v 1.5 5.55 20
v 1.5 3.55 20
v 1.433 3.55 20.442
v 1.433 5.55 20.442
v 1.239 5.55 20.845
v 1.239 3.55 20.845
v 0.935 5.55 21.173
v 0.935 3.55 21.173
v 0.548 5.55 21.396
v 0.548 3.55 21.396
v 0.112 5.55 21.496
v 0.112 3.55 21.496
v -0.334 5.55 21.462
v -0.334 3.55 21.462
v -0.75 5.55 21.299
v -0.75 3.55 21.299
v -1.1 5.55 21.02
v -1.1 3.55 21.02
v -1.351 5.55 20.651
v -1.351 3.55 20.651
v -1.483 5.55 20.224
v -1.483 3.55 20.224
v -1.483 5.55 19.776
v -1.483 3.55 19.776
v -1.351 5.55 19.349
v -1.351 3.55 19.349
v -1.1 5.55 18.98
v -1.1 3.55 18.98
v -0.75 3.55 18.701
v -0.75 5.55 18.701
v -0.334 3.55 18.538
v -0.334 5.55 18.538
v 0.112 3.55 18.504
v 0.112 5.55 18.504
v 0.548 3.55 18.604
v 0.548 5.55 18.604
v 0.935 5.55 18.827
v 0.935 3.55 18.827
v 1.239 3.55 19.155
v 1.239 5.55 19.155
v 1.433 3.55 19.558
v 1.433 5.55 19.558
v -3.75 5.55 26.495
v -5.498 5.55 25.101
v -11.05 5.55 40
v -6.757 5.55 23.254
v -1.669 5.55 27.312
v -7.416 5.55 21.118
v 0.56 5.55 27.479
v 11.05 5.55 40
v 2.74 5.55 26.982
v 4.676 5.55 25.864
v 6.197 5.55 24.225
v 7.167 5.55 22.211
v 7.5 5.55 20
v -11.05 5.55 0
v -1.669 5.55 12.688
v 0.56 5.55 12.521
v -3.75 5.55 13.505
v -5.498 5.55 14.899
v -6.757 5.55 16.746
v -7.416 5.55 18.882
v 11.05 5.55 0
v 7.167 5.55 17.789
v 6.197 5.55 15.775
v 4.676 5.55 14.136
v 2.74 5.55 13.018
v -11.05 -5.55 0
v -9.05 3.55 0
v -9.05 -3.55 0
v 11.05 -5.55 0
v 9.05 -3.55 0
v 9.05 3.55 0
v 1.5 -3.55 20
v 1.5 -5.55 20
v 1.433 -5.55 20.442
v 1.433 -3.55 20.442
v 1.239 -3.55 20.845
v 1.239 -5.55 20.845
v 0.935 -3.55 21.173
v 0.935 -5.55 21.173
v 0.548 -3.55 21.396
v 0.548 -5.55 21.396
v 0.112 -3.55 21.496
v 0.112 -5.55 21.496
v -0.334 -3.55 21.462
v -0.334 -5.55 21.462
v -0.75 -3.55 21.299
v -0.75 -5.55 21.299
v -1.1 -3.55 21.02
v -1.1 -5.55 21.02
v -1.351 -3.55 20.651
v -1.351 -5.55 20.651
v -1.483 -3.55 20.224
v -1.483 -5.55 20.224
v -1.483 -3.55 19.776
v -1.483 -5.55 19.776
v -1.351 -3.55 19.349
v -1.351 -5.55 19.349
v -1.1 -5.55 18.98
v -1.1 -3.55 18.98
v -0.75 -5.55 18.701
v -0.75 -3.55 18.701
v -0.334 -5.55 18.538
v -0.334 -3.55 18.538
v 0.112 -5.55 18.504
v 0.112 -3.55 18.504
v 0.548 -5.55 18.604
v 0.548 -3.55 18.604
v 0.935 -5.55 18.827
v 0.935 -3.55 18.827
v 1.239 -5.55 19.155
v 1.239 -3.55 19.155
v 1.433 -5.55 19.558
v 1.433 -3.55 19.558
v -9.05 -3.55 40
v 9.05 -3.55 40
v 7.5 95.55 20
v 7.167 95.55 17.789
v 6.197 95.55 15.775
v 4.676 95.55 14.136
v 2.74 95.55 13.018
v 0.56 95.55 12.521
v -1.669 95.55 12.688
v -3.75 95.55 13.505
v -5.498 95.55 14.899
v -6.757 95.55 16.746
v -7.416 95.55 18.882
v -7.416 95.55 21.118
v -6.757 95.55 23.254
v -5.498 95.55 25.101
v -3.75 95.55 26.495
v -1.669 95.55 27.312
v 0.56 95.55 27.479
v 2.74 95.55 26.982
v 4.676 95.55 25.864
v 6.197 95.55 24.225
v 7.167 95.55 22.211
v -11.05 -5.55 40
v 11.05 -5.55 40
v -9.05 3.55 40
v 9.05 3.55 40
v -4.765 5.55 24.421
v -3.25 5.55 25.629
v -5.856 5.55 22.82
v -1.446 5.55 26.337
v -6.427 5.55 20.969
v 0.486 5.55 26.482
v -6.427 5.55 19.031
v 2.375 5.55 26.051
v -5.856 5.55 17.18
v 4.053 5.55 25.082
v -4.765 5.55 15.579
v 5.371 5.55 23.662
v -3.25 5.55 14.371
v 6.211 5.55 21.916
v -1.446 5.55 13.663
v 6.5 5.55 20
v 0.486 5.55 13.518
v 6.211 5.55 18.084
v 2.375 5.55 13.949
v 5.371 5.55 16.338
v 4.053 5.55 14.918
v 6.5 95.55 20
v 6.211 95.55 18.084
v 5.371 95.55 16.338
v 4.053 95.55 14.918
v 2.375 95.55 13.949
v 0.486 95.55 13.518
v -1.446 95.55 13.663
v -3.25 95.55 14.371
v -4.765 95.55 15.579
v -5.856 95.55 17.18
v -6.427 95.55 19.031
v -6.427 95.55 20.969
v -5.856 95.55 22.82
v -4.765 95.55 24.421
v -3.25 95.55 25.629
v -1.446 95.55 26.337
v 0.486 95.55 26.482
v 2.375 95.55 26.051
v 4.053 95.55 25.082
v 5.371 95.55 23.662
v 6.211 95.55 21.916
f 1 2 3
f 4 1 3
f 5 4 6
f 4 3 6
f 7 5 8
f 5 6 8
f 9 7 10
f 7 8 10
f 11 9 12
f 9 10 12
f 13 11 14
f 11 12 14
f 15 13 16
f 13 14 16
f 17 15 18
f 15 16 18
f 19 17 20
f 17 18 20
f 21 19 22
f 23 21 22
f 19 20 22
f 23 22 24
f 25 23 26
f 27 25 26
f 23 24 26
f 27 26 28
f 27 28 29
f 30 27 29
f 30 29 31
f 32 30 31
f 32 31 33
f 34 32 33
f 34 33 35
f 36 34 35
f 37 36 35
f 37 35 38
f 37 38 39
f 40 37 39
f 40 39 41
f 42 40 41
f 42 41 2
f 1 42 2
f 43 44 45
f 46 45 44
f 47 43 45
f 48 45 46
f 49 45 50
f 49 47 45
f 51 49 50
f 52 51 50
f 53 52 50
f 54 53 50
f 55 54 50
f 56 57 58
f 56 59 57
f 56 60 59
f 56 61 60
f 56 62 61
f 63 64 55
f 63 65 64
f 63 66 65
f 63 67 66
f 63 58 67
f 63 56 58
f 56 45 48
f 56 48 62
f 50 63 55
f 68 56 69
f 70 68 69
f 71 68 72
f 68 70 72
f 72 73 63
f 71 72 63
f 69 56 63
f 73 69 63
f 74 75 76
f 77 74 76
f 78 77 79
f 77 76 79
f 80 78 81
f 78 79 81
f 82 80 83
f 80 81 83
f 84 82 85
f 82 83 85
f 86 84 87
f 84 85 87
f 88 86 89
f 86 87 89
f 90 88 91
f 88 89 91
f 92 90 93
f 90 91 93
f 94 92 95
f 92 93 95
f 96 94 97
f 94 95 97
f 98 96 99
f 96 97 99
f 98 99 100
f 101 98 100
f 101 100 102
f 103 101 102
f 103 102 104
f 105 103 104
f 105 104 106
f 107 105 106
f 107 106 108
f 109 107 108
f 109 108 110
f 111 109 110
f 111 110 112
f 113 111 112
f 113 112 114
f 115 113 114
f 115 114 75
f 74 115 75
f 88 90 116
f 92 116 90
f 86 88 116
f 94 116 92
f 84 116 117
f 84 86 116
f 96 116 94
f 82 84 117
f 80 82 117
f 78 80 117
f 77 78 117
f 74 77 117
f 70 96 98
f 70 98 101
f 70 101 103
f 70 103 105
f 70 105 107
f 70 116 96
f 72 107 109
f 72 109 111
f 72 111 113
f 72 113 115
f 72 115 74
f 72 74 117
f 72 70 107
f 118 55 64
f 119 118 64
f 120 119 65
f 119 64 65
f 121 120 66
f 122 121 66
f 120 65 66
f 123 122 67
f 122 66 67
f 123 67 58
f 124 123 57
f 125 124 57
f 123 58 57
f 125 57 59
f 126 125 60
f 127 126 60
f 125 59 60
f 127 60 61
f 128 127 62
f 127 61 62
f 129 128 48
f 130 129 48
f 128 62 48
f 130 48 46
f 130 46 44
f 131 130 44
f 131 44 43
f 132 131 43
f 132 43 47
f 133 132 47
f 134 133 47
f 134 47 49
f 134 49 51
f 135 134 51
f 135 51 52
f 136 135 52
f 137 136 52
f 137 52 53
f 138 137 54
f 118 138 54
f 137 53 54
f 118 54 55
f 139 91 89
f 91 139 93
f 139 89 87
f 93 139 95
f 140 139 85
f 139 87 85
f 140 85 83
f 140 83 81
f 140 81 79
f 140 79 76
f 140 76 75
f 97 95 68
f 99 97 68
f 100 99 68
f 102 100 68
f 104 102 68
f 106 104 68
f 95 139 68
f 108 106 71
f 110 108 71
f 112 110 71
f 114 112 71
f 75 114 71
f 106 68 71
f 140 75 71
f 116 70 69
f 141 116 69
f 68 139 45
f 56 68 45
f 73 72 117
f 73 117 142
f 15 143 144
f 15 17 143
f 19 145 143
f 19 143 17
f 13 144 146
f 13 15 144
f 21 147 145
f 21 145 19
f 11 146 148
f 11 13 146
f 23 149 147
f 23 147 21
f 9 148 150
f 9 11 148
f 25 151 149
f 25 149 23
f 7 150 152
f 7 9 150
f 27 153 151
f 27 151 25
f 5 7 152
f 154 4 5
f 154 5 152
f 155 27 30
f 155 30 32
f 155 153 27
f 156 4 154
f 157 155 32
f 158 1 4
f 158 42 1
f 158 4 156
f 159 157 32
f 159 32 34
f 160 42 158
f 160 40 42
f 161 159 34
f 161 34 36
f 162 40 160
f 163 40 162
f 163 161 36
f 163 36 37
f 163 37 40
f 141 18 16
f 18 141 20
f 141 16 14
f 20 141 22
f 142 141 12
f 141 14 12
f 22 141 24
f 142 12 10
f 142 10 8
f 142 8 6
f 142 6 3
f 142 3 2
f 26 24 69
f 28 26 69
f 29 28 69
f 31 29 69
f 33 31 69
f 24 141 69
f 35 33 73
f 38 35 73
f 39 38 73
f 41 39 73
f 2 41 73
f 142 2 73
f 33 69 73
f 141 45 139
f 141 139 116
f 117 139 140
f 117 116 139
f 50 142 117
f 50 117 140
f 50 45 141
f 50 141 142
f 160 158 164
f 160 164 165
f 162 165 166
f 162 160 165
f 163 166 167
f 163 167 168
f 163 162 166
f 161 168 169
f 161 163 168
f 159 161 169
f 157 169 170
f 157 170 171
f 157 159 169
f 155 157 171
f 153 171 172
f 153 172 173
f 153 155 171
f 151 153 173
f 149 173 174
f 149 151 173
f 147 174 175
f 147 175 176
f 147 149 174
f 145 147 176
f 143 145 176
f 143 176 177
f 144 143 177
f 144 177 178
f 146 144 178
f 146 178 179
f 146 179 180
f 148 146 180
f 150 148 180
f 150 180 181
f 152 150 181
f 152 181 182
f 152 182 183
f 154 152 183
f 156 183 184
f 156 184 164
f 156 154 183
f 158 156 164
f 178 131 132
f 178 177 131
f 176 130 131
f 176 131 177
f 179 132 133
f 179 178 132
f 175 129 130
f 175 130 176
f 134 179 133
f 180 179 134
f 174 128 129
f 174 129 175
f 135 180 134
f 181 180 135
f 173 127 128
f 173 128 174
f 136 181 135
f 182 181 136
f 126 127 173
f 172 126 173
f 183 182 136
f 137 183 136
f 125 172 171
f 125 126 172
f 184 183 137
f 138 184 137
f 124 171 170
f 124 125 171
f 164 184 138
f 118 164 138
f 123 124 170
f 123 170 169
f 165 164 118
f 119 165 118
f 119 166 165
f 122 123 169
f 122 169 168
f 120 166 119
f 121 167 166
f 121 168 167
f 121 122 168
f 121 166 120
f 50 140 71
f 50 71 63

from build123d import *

# Parameters (mm, degrees)
SKETCH1_W           = 22.1
SKETCH1_H           = 11.1
SKETCH1_W_2         = 18.1
SKETCH1_H_2         = 7.1
BOSS_EXTRUDE1_DEPTH = 40
SKETCH2_R           = 1.5
CUT_EXTRUDE1_DEPTH  = 33
SKETCH3_R           = 7.5
SKETCH3_R_2         = 6.5
BOSS_EXTRUDE3_DEPTH = 90


with BuildPart() as part:
    # Sketch1 → Boss-Extrude1 (new body)
    with BuildSketch(Plane.XY):
        Rectangle(SKETCH1_W, SKETCH1_H)
        Rectangle(SKETCH1_W_2, SKETCH1_H_2, mode=Mode.SUBTRACT)
    extrude(amount=BOSS_EXTRUDE1_DEPTH)

    # Sketch2 → Cut-Extrude1 (cut)
    with BuildSketch(Plane.XZ.offset(5.55)):
        with Locations((0, 20)):
            Circle(SKETCH2_R)
    extrude(amount=-CUT_EXTRUDE1_DEPTH, mode=Mode.SUBTRACT)

    # Sketch3 → Boss-Extrude3 (add)
    with BuildSketch(Plane(origin=(0, 5.55, 0), x_dir=(1, 0, 0), z_dir=(0, 1, 0))):
        with Locations((0, -20)):
            Circle(SKETCH3_R)
        with Locations((0, -20)):
            Circle(SKETCH3_R_2, mode=Mode.SUBTRACT)
    extrude(amount=BOSS_EXTRUDE3_DEPTH)


solid = part.part
